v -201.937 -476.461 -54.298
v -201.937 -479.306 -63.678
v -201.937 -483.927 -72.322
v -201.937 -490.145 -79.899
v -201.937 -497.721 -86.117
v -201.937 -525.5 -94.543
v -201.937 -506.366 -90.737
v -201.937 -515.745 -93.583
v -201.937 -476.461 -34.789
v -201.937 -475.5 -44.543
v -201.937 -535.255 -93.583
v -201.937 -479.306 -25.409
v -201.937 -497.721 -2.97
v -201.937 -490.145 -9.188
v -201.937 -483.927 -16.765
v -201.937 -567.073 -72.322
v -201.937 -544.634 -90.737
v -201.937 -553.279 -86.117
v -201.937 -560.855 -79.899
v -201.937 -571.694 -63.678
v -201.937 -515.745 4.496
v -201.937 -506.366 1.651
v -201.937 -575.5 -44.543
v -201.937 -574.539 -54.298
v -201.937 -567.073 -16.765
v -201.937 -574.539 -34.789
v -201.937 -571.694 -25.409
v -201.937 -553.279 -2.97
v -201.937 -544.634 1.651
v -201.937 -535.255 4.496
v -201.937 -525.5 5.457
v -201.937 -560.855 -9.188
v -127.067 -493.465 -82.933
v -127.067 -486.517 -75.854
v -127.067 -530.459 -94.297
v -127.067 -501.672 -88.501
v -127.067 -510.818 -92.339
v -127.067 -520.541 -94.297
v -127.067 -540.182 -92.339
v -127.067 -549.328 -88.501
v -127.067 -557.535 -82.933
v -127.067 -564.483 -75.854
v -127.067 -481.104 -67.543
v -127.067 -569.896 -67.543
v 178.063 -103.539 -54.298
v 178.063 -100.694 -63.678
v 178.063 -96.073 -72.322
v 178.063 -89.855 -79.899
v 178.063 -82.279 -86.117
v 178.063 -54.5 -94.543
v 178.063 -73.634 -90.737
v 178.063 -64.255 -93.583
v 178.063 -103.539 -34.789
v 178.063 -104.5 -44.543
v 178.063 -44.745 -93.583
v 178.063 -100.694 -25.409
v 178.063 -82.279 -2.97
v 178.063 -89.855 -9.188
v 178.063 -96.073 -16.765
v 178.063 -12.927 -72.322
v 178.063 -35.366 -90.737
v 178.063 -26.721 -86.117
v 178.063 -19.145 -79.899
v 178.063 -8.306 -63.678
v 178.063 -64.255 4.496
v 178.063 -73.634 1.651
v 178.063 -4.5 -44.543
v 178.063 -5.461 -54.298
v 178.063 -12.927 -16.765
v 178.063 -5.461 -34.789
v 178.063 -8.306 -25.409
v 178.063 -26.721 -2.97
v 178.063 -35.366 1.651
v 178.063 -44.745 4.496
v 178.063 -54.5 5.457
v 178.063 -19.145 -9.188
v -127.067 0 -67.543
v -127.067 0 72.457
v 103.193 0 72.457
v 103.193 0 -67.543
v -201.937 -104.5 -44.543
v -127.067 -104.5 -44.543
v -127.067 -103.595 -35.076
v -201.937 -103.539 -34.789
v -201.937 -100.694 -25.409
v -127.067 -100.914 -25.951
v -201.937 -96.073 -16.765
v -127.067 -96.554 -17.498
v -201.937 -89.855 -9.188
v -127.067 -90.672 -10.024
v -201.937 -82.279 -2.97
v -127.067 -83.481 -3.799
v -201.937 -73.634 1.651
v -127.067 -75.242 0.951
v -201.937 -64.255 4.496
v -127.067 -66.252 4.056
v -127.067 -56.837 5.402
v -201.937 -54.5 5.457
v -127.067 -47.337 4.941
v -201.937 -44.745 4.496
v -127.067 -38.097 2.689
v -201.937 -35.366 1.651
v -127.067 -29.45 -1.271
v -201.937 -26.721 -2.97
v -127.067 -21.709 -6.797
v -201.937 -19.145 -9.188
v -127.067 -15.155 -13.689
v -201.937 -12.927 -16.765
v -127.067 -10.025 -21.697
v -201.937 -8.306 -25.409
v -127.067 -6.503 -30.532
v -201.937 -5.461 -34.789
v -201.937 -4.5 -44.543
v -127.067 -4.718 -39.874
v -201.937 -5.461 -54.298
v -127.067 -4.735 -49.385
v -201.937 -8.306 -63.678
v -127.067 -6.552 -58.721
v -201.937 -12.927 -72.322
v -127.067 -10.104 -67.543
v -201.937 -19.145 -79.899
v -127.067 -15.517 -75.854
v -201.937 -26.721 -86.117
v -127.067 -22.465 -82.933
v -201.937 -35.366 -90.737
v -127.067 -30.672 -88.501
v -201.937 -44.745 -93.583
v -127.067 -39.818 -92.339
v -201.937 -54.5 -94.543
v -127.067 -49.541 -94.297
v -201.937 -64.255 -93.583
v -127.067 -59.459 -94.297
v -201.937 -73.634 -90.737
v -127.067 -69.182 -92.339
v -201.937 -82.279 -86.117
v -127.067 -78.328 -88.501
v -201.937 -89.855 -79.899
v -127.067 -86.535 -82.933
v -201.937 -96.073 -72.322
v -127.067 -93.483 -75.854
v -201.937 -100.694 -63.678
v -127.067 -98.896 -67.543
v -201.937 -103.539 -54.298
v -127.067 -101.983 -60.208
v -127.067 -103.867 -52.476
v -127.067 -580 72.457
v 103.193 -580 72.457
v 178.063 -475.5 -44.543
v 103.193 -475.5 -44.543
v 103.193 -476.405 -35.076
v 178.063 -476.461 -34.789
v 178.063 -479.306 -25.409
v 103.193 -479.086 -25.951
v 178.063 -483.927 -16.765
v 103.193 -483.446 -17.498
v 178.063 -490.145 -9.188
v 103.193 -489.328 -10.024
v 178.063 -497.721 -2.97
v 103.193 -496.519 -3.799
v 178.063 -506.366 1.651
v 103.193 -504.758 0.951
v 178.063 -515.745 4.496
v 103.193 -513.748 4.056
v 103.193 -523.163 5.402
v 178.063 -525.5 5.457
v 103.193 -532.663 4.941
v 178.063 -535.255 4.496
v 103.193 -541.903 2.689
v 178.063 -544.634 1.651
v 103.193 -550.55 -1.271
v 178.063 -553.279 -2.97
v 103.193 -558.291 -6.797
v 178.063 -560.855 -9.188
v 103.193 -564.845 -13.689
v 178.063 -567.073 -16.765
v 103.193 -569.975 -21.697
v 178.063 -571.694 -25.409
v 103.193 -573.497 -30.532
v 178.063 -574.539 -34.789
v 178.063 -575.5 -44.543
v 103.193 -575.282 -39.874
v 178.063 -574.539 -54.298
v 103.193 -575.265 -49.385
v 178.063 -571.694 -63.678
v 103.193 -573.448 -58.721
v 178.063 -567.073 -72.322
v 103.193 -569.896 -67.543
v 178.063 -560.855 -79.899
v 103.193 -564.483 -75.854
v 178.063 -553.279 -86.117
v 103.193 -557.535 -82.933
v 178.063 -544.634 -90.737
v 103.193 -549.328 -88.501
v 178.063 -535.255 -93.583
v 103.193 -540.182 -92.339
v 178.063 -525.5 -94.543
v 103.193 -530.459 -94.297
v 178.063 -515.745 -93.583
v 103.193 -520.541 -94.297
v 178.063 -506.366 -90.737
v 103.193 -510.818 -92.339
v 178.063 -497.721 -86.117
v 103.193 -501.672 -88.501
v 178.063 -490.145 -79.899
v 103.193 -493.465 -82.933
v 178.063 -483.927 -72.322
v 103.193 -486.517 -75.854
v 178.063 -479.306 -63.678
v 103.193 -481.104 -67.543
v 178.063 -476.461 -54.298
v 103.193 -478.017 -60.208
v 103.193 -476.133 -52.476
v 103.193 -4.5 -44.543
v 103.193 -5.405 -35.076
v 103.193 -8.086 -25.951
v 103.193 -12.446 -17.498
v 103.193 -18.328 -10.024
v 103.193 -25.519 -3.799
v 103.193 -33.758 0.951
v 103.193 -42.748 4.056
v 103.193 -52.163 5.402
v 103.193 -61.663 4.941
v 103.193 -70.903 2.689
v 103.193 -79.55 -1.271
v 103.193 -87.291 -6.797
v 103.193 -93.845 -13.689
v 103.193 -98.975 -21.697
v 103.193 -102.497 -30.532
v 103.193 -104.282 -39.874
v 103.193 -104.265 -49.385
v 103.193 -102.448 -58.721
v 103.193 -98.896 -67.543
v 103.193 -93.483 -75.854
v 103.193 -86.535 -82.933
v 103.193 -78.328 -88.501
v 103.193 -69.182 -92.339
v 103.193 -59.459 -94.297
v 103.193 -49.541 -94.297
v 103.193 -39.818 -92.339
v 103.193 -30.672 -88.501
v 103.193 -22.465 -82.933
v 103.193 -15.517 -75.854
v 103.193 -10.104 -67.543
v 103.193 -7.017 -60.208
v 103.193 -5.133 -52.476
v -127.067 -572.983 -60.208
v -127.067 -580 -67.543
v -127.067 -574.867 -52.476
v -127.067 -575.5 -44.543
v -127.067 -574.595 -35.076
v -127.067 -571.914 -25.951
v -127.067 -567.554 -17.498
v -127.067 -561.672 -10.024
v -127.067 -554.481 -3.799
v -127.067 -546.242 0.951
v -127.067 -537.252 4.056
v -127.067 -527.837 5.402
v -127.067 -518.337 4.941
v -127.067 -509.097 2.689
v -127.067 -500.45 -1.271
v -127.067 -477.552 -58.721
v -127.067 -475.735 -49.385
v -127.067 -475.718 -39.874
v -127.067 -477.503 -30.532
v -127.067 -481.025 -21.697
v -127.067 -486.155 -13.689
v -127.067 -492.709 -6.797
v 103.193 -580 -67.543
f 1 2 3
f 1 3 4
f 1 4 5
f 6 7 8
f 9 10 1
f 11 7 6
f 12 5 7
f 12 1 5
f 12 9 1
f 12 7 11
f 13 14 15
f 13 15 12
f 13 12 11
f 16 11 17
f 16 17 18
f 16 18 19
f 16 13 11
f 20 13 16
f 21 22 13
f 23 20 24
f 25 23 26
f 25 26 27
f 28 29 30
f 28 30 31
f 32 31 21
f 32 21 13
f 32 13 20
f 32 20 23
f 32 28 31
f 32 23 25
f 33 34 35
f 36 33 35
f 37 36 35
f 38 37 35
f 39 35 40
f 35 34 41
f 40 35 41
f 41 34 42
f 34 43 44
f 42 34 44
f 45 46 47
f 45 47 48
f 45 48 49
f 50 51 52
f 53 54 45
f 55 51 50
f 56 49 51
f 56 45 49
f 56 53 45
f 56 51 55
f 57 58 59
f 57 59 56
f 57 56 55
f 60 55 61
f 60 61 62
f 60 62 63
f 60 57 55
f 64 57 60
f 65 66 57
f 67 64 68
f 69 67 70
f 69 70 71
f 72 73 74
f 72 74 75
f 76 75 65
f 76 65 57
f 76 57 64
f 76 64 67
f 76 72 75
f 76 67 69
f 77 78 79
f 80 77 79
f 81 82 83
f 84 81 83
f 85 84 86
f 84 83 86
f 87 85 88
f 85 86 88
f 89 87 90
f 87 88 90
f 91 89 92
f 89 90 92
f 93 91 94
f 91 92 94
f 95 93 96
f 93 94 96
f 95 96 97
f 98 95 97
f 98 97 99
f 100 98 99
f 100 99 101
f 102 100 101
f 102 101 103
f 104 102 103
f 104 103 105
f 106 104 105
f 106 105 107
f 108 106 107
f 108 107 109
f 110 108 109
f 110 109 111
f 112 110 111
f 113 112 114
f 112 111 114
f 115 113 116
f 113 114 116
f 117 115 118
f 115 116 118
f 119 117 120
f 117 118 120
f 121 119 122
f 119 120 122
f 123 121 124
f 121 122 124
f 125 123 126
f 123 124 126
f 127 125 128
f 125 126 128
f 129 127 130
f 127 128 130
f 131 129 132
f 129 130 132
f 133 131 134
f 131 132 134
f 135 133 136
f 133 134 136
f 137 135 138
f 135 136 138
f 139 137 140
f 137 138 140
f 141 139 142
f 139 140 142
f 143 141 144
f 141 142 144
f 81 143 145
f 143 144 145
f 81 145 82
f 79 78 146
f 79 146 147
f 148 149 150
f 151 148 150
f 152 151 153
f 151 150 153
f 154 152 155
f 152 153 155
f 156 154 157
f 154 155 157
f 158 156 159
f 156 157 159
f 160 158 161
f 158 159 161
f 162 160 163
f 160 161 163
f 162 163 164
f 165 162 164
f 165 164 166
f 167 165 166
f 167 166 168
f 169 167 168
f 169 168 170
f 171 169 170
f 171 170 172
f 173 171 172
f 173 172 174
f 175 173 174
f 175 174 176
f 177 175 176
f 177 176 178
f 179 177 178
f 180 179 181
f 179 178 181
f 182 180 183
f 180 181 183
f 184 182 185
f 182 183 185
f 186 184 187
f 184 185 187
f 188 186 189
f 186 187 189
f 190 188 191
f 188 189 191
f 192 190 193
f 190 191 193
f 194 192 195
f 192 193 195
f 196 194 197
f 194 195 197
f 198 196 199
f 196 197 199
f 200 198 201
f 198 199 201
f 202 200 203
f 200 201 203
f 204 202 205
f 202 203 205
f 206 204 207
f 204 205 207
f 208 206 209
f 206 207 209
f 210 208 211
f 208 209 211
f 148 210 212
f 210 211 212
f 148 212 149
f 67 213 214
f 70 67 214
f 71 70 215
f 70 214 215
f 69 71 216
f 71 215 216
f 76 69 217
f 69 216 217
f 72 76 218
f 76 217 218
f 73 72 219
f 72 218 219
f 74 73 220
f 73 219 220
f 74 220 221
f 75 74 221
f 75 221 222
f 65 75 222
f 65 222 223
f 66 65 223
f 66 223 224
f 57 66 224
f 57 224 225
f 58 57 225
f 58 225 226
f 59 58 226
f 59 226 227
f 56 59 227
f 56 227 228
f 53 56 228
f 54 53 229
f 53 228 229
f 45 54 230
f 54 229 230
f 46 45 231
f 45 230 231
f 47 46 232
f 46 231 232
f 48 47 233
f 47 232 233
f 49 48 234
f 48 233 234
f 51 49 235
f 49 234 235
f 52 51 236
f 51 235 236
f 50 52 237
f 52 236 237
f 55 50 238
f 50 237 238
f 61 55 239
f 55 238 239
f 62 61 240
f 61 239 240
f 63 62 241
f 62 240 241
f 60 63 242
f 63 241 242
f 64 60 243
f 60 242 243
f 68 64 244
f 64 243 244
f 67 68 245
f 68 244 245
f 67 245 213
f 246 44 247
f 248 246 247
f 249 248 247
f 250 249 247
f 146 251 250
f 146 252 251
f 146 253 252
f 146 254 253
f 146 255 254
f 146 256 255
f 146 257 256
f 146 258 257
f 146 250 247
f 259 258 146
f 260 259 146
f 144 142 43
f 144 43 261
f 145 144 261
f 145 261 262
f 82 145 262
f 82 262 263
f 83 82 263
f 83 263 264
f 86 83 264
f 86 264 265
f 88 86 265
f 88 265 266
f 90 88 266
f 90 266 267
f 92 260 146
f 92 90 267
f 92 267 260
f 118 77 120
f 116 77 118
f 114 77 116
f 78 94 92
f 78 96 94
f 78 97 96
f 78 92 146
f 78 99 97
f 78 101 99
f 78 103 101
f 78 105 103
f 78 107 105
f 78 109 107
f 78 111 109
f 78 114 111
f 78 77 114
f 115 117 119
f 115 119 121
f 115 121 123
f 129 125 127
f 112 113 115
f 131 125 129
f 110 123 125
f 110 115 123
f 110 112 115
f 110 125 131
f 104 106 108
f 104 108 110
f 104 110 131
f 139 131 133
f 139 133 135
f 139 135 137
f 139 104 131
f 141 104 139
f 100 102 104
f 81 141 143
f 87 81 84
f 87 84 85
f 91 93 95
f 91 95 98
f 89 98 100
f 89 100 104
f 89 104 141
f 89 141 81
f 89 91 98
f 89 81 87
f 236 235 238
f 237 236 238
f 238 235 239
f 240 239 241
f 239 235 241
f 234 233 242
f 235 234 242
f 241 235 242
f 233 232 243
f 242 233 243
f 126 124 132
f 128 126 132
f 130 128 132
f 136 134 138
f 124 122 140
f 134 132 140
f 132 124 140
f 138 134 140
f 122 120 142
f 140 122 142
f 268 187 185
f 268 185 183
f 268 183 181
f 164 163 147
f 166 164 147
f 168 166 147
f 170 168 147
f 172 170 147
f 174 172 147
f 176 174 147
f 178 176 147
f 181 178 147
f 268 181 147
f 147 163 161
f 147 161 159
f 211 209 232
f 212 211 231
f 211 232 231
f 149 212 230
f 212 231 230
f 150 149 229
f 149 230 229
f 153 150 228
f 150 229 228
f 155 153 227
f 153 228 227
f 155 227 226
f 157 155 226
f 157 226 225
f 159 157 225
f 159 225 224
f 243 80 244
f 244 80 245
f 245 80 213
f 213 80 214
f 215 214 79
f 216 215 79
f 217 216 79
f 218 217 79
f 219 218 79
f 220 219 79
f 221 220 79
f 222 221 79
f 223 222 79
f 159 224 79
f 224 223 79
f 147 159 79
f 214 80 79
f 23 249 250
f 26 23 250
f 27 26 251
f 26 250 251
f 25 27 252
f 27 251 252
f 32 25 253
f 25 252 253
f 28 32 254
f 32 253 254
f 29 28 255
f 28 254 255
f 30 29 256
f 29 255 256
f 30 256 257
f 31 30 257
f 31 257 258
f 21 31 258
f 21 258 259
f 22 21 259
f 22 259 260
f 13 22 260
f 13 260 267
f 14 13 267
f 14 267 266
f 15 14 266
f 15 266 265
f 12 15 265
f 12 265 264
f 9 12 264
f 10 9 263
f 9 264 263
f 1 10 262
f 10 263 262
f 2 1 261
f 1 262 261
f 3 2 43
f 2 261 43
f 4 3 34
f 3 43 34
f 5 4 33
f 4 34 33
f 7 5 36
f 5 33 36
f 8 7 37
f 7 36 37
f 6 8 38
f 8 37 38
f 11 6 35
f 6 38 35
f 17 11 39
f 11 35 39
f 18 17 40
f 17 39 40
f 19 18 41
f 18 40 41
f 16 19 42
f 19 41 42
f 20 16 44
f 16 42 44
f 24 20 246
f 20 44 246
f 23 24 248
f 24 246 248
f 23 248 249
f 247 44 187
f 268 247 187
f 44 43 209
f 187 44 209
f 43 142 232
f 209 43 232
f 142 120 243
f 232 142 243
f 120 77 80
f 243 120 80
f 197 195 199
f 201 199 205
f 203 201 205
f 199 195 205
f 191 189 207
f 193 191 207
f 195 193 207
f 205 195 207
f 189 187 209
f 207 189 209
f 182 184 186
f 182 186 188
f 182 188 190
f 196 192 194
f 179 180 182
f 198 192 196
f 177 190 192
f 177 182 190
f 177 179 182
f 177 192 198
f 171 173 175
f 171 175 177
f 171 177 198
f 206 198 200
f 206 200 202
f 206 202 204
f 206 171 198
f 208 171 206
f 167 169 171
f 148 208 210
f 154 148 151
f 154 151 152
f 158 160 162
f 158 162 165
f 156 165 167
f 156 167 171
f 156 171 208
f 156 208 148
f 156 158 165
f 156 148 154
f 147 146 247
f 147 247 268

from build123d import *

# Parameters (mm, degrees)
F0_W     = 230.26
F0_H     = 140
F1_DEPTH = 580
F2_R     = 50
F3_DEPTH = 74.87
F4_R     = 50
F5_DEPTH = 74.87


with BuildPart() as f1:
    # F0 (on Front) → F1 (new body)
    with BuildSketch(Plane.XZ):
        with Locations((-11.937493, 2.456602)):
            Rectangle(F0_W, F0_H)
    extrude(amount=F1_DEPTH)

    # F2 (on face) → F3 (join)
    with BuildSketch(Plane(origin=(-127.067493, 0, 0), x_dir=(0, -1, 0), z_dir=(-1, 0, 0))):
        with Locations((54.5, -44.543398)):
            Circle(F2_R)
        with Locations((525.5, -44.543398)):
            Circle(F2_R)
    extrude(amount=F3_DEPTH)

    # F4 (on face) → F5 (join)
    with BuildSketch(Plane.YZ.offset(103.192507)):
        with Locations((-525.5, -44.543398)):
            Circle(F4_R)
        with Locations((-54.5, -44.543398)):
            Circle(F4_R)
    extrude(amount=F5_DEPTH)


solid = f1.part
